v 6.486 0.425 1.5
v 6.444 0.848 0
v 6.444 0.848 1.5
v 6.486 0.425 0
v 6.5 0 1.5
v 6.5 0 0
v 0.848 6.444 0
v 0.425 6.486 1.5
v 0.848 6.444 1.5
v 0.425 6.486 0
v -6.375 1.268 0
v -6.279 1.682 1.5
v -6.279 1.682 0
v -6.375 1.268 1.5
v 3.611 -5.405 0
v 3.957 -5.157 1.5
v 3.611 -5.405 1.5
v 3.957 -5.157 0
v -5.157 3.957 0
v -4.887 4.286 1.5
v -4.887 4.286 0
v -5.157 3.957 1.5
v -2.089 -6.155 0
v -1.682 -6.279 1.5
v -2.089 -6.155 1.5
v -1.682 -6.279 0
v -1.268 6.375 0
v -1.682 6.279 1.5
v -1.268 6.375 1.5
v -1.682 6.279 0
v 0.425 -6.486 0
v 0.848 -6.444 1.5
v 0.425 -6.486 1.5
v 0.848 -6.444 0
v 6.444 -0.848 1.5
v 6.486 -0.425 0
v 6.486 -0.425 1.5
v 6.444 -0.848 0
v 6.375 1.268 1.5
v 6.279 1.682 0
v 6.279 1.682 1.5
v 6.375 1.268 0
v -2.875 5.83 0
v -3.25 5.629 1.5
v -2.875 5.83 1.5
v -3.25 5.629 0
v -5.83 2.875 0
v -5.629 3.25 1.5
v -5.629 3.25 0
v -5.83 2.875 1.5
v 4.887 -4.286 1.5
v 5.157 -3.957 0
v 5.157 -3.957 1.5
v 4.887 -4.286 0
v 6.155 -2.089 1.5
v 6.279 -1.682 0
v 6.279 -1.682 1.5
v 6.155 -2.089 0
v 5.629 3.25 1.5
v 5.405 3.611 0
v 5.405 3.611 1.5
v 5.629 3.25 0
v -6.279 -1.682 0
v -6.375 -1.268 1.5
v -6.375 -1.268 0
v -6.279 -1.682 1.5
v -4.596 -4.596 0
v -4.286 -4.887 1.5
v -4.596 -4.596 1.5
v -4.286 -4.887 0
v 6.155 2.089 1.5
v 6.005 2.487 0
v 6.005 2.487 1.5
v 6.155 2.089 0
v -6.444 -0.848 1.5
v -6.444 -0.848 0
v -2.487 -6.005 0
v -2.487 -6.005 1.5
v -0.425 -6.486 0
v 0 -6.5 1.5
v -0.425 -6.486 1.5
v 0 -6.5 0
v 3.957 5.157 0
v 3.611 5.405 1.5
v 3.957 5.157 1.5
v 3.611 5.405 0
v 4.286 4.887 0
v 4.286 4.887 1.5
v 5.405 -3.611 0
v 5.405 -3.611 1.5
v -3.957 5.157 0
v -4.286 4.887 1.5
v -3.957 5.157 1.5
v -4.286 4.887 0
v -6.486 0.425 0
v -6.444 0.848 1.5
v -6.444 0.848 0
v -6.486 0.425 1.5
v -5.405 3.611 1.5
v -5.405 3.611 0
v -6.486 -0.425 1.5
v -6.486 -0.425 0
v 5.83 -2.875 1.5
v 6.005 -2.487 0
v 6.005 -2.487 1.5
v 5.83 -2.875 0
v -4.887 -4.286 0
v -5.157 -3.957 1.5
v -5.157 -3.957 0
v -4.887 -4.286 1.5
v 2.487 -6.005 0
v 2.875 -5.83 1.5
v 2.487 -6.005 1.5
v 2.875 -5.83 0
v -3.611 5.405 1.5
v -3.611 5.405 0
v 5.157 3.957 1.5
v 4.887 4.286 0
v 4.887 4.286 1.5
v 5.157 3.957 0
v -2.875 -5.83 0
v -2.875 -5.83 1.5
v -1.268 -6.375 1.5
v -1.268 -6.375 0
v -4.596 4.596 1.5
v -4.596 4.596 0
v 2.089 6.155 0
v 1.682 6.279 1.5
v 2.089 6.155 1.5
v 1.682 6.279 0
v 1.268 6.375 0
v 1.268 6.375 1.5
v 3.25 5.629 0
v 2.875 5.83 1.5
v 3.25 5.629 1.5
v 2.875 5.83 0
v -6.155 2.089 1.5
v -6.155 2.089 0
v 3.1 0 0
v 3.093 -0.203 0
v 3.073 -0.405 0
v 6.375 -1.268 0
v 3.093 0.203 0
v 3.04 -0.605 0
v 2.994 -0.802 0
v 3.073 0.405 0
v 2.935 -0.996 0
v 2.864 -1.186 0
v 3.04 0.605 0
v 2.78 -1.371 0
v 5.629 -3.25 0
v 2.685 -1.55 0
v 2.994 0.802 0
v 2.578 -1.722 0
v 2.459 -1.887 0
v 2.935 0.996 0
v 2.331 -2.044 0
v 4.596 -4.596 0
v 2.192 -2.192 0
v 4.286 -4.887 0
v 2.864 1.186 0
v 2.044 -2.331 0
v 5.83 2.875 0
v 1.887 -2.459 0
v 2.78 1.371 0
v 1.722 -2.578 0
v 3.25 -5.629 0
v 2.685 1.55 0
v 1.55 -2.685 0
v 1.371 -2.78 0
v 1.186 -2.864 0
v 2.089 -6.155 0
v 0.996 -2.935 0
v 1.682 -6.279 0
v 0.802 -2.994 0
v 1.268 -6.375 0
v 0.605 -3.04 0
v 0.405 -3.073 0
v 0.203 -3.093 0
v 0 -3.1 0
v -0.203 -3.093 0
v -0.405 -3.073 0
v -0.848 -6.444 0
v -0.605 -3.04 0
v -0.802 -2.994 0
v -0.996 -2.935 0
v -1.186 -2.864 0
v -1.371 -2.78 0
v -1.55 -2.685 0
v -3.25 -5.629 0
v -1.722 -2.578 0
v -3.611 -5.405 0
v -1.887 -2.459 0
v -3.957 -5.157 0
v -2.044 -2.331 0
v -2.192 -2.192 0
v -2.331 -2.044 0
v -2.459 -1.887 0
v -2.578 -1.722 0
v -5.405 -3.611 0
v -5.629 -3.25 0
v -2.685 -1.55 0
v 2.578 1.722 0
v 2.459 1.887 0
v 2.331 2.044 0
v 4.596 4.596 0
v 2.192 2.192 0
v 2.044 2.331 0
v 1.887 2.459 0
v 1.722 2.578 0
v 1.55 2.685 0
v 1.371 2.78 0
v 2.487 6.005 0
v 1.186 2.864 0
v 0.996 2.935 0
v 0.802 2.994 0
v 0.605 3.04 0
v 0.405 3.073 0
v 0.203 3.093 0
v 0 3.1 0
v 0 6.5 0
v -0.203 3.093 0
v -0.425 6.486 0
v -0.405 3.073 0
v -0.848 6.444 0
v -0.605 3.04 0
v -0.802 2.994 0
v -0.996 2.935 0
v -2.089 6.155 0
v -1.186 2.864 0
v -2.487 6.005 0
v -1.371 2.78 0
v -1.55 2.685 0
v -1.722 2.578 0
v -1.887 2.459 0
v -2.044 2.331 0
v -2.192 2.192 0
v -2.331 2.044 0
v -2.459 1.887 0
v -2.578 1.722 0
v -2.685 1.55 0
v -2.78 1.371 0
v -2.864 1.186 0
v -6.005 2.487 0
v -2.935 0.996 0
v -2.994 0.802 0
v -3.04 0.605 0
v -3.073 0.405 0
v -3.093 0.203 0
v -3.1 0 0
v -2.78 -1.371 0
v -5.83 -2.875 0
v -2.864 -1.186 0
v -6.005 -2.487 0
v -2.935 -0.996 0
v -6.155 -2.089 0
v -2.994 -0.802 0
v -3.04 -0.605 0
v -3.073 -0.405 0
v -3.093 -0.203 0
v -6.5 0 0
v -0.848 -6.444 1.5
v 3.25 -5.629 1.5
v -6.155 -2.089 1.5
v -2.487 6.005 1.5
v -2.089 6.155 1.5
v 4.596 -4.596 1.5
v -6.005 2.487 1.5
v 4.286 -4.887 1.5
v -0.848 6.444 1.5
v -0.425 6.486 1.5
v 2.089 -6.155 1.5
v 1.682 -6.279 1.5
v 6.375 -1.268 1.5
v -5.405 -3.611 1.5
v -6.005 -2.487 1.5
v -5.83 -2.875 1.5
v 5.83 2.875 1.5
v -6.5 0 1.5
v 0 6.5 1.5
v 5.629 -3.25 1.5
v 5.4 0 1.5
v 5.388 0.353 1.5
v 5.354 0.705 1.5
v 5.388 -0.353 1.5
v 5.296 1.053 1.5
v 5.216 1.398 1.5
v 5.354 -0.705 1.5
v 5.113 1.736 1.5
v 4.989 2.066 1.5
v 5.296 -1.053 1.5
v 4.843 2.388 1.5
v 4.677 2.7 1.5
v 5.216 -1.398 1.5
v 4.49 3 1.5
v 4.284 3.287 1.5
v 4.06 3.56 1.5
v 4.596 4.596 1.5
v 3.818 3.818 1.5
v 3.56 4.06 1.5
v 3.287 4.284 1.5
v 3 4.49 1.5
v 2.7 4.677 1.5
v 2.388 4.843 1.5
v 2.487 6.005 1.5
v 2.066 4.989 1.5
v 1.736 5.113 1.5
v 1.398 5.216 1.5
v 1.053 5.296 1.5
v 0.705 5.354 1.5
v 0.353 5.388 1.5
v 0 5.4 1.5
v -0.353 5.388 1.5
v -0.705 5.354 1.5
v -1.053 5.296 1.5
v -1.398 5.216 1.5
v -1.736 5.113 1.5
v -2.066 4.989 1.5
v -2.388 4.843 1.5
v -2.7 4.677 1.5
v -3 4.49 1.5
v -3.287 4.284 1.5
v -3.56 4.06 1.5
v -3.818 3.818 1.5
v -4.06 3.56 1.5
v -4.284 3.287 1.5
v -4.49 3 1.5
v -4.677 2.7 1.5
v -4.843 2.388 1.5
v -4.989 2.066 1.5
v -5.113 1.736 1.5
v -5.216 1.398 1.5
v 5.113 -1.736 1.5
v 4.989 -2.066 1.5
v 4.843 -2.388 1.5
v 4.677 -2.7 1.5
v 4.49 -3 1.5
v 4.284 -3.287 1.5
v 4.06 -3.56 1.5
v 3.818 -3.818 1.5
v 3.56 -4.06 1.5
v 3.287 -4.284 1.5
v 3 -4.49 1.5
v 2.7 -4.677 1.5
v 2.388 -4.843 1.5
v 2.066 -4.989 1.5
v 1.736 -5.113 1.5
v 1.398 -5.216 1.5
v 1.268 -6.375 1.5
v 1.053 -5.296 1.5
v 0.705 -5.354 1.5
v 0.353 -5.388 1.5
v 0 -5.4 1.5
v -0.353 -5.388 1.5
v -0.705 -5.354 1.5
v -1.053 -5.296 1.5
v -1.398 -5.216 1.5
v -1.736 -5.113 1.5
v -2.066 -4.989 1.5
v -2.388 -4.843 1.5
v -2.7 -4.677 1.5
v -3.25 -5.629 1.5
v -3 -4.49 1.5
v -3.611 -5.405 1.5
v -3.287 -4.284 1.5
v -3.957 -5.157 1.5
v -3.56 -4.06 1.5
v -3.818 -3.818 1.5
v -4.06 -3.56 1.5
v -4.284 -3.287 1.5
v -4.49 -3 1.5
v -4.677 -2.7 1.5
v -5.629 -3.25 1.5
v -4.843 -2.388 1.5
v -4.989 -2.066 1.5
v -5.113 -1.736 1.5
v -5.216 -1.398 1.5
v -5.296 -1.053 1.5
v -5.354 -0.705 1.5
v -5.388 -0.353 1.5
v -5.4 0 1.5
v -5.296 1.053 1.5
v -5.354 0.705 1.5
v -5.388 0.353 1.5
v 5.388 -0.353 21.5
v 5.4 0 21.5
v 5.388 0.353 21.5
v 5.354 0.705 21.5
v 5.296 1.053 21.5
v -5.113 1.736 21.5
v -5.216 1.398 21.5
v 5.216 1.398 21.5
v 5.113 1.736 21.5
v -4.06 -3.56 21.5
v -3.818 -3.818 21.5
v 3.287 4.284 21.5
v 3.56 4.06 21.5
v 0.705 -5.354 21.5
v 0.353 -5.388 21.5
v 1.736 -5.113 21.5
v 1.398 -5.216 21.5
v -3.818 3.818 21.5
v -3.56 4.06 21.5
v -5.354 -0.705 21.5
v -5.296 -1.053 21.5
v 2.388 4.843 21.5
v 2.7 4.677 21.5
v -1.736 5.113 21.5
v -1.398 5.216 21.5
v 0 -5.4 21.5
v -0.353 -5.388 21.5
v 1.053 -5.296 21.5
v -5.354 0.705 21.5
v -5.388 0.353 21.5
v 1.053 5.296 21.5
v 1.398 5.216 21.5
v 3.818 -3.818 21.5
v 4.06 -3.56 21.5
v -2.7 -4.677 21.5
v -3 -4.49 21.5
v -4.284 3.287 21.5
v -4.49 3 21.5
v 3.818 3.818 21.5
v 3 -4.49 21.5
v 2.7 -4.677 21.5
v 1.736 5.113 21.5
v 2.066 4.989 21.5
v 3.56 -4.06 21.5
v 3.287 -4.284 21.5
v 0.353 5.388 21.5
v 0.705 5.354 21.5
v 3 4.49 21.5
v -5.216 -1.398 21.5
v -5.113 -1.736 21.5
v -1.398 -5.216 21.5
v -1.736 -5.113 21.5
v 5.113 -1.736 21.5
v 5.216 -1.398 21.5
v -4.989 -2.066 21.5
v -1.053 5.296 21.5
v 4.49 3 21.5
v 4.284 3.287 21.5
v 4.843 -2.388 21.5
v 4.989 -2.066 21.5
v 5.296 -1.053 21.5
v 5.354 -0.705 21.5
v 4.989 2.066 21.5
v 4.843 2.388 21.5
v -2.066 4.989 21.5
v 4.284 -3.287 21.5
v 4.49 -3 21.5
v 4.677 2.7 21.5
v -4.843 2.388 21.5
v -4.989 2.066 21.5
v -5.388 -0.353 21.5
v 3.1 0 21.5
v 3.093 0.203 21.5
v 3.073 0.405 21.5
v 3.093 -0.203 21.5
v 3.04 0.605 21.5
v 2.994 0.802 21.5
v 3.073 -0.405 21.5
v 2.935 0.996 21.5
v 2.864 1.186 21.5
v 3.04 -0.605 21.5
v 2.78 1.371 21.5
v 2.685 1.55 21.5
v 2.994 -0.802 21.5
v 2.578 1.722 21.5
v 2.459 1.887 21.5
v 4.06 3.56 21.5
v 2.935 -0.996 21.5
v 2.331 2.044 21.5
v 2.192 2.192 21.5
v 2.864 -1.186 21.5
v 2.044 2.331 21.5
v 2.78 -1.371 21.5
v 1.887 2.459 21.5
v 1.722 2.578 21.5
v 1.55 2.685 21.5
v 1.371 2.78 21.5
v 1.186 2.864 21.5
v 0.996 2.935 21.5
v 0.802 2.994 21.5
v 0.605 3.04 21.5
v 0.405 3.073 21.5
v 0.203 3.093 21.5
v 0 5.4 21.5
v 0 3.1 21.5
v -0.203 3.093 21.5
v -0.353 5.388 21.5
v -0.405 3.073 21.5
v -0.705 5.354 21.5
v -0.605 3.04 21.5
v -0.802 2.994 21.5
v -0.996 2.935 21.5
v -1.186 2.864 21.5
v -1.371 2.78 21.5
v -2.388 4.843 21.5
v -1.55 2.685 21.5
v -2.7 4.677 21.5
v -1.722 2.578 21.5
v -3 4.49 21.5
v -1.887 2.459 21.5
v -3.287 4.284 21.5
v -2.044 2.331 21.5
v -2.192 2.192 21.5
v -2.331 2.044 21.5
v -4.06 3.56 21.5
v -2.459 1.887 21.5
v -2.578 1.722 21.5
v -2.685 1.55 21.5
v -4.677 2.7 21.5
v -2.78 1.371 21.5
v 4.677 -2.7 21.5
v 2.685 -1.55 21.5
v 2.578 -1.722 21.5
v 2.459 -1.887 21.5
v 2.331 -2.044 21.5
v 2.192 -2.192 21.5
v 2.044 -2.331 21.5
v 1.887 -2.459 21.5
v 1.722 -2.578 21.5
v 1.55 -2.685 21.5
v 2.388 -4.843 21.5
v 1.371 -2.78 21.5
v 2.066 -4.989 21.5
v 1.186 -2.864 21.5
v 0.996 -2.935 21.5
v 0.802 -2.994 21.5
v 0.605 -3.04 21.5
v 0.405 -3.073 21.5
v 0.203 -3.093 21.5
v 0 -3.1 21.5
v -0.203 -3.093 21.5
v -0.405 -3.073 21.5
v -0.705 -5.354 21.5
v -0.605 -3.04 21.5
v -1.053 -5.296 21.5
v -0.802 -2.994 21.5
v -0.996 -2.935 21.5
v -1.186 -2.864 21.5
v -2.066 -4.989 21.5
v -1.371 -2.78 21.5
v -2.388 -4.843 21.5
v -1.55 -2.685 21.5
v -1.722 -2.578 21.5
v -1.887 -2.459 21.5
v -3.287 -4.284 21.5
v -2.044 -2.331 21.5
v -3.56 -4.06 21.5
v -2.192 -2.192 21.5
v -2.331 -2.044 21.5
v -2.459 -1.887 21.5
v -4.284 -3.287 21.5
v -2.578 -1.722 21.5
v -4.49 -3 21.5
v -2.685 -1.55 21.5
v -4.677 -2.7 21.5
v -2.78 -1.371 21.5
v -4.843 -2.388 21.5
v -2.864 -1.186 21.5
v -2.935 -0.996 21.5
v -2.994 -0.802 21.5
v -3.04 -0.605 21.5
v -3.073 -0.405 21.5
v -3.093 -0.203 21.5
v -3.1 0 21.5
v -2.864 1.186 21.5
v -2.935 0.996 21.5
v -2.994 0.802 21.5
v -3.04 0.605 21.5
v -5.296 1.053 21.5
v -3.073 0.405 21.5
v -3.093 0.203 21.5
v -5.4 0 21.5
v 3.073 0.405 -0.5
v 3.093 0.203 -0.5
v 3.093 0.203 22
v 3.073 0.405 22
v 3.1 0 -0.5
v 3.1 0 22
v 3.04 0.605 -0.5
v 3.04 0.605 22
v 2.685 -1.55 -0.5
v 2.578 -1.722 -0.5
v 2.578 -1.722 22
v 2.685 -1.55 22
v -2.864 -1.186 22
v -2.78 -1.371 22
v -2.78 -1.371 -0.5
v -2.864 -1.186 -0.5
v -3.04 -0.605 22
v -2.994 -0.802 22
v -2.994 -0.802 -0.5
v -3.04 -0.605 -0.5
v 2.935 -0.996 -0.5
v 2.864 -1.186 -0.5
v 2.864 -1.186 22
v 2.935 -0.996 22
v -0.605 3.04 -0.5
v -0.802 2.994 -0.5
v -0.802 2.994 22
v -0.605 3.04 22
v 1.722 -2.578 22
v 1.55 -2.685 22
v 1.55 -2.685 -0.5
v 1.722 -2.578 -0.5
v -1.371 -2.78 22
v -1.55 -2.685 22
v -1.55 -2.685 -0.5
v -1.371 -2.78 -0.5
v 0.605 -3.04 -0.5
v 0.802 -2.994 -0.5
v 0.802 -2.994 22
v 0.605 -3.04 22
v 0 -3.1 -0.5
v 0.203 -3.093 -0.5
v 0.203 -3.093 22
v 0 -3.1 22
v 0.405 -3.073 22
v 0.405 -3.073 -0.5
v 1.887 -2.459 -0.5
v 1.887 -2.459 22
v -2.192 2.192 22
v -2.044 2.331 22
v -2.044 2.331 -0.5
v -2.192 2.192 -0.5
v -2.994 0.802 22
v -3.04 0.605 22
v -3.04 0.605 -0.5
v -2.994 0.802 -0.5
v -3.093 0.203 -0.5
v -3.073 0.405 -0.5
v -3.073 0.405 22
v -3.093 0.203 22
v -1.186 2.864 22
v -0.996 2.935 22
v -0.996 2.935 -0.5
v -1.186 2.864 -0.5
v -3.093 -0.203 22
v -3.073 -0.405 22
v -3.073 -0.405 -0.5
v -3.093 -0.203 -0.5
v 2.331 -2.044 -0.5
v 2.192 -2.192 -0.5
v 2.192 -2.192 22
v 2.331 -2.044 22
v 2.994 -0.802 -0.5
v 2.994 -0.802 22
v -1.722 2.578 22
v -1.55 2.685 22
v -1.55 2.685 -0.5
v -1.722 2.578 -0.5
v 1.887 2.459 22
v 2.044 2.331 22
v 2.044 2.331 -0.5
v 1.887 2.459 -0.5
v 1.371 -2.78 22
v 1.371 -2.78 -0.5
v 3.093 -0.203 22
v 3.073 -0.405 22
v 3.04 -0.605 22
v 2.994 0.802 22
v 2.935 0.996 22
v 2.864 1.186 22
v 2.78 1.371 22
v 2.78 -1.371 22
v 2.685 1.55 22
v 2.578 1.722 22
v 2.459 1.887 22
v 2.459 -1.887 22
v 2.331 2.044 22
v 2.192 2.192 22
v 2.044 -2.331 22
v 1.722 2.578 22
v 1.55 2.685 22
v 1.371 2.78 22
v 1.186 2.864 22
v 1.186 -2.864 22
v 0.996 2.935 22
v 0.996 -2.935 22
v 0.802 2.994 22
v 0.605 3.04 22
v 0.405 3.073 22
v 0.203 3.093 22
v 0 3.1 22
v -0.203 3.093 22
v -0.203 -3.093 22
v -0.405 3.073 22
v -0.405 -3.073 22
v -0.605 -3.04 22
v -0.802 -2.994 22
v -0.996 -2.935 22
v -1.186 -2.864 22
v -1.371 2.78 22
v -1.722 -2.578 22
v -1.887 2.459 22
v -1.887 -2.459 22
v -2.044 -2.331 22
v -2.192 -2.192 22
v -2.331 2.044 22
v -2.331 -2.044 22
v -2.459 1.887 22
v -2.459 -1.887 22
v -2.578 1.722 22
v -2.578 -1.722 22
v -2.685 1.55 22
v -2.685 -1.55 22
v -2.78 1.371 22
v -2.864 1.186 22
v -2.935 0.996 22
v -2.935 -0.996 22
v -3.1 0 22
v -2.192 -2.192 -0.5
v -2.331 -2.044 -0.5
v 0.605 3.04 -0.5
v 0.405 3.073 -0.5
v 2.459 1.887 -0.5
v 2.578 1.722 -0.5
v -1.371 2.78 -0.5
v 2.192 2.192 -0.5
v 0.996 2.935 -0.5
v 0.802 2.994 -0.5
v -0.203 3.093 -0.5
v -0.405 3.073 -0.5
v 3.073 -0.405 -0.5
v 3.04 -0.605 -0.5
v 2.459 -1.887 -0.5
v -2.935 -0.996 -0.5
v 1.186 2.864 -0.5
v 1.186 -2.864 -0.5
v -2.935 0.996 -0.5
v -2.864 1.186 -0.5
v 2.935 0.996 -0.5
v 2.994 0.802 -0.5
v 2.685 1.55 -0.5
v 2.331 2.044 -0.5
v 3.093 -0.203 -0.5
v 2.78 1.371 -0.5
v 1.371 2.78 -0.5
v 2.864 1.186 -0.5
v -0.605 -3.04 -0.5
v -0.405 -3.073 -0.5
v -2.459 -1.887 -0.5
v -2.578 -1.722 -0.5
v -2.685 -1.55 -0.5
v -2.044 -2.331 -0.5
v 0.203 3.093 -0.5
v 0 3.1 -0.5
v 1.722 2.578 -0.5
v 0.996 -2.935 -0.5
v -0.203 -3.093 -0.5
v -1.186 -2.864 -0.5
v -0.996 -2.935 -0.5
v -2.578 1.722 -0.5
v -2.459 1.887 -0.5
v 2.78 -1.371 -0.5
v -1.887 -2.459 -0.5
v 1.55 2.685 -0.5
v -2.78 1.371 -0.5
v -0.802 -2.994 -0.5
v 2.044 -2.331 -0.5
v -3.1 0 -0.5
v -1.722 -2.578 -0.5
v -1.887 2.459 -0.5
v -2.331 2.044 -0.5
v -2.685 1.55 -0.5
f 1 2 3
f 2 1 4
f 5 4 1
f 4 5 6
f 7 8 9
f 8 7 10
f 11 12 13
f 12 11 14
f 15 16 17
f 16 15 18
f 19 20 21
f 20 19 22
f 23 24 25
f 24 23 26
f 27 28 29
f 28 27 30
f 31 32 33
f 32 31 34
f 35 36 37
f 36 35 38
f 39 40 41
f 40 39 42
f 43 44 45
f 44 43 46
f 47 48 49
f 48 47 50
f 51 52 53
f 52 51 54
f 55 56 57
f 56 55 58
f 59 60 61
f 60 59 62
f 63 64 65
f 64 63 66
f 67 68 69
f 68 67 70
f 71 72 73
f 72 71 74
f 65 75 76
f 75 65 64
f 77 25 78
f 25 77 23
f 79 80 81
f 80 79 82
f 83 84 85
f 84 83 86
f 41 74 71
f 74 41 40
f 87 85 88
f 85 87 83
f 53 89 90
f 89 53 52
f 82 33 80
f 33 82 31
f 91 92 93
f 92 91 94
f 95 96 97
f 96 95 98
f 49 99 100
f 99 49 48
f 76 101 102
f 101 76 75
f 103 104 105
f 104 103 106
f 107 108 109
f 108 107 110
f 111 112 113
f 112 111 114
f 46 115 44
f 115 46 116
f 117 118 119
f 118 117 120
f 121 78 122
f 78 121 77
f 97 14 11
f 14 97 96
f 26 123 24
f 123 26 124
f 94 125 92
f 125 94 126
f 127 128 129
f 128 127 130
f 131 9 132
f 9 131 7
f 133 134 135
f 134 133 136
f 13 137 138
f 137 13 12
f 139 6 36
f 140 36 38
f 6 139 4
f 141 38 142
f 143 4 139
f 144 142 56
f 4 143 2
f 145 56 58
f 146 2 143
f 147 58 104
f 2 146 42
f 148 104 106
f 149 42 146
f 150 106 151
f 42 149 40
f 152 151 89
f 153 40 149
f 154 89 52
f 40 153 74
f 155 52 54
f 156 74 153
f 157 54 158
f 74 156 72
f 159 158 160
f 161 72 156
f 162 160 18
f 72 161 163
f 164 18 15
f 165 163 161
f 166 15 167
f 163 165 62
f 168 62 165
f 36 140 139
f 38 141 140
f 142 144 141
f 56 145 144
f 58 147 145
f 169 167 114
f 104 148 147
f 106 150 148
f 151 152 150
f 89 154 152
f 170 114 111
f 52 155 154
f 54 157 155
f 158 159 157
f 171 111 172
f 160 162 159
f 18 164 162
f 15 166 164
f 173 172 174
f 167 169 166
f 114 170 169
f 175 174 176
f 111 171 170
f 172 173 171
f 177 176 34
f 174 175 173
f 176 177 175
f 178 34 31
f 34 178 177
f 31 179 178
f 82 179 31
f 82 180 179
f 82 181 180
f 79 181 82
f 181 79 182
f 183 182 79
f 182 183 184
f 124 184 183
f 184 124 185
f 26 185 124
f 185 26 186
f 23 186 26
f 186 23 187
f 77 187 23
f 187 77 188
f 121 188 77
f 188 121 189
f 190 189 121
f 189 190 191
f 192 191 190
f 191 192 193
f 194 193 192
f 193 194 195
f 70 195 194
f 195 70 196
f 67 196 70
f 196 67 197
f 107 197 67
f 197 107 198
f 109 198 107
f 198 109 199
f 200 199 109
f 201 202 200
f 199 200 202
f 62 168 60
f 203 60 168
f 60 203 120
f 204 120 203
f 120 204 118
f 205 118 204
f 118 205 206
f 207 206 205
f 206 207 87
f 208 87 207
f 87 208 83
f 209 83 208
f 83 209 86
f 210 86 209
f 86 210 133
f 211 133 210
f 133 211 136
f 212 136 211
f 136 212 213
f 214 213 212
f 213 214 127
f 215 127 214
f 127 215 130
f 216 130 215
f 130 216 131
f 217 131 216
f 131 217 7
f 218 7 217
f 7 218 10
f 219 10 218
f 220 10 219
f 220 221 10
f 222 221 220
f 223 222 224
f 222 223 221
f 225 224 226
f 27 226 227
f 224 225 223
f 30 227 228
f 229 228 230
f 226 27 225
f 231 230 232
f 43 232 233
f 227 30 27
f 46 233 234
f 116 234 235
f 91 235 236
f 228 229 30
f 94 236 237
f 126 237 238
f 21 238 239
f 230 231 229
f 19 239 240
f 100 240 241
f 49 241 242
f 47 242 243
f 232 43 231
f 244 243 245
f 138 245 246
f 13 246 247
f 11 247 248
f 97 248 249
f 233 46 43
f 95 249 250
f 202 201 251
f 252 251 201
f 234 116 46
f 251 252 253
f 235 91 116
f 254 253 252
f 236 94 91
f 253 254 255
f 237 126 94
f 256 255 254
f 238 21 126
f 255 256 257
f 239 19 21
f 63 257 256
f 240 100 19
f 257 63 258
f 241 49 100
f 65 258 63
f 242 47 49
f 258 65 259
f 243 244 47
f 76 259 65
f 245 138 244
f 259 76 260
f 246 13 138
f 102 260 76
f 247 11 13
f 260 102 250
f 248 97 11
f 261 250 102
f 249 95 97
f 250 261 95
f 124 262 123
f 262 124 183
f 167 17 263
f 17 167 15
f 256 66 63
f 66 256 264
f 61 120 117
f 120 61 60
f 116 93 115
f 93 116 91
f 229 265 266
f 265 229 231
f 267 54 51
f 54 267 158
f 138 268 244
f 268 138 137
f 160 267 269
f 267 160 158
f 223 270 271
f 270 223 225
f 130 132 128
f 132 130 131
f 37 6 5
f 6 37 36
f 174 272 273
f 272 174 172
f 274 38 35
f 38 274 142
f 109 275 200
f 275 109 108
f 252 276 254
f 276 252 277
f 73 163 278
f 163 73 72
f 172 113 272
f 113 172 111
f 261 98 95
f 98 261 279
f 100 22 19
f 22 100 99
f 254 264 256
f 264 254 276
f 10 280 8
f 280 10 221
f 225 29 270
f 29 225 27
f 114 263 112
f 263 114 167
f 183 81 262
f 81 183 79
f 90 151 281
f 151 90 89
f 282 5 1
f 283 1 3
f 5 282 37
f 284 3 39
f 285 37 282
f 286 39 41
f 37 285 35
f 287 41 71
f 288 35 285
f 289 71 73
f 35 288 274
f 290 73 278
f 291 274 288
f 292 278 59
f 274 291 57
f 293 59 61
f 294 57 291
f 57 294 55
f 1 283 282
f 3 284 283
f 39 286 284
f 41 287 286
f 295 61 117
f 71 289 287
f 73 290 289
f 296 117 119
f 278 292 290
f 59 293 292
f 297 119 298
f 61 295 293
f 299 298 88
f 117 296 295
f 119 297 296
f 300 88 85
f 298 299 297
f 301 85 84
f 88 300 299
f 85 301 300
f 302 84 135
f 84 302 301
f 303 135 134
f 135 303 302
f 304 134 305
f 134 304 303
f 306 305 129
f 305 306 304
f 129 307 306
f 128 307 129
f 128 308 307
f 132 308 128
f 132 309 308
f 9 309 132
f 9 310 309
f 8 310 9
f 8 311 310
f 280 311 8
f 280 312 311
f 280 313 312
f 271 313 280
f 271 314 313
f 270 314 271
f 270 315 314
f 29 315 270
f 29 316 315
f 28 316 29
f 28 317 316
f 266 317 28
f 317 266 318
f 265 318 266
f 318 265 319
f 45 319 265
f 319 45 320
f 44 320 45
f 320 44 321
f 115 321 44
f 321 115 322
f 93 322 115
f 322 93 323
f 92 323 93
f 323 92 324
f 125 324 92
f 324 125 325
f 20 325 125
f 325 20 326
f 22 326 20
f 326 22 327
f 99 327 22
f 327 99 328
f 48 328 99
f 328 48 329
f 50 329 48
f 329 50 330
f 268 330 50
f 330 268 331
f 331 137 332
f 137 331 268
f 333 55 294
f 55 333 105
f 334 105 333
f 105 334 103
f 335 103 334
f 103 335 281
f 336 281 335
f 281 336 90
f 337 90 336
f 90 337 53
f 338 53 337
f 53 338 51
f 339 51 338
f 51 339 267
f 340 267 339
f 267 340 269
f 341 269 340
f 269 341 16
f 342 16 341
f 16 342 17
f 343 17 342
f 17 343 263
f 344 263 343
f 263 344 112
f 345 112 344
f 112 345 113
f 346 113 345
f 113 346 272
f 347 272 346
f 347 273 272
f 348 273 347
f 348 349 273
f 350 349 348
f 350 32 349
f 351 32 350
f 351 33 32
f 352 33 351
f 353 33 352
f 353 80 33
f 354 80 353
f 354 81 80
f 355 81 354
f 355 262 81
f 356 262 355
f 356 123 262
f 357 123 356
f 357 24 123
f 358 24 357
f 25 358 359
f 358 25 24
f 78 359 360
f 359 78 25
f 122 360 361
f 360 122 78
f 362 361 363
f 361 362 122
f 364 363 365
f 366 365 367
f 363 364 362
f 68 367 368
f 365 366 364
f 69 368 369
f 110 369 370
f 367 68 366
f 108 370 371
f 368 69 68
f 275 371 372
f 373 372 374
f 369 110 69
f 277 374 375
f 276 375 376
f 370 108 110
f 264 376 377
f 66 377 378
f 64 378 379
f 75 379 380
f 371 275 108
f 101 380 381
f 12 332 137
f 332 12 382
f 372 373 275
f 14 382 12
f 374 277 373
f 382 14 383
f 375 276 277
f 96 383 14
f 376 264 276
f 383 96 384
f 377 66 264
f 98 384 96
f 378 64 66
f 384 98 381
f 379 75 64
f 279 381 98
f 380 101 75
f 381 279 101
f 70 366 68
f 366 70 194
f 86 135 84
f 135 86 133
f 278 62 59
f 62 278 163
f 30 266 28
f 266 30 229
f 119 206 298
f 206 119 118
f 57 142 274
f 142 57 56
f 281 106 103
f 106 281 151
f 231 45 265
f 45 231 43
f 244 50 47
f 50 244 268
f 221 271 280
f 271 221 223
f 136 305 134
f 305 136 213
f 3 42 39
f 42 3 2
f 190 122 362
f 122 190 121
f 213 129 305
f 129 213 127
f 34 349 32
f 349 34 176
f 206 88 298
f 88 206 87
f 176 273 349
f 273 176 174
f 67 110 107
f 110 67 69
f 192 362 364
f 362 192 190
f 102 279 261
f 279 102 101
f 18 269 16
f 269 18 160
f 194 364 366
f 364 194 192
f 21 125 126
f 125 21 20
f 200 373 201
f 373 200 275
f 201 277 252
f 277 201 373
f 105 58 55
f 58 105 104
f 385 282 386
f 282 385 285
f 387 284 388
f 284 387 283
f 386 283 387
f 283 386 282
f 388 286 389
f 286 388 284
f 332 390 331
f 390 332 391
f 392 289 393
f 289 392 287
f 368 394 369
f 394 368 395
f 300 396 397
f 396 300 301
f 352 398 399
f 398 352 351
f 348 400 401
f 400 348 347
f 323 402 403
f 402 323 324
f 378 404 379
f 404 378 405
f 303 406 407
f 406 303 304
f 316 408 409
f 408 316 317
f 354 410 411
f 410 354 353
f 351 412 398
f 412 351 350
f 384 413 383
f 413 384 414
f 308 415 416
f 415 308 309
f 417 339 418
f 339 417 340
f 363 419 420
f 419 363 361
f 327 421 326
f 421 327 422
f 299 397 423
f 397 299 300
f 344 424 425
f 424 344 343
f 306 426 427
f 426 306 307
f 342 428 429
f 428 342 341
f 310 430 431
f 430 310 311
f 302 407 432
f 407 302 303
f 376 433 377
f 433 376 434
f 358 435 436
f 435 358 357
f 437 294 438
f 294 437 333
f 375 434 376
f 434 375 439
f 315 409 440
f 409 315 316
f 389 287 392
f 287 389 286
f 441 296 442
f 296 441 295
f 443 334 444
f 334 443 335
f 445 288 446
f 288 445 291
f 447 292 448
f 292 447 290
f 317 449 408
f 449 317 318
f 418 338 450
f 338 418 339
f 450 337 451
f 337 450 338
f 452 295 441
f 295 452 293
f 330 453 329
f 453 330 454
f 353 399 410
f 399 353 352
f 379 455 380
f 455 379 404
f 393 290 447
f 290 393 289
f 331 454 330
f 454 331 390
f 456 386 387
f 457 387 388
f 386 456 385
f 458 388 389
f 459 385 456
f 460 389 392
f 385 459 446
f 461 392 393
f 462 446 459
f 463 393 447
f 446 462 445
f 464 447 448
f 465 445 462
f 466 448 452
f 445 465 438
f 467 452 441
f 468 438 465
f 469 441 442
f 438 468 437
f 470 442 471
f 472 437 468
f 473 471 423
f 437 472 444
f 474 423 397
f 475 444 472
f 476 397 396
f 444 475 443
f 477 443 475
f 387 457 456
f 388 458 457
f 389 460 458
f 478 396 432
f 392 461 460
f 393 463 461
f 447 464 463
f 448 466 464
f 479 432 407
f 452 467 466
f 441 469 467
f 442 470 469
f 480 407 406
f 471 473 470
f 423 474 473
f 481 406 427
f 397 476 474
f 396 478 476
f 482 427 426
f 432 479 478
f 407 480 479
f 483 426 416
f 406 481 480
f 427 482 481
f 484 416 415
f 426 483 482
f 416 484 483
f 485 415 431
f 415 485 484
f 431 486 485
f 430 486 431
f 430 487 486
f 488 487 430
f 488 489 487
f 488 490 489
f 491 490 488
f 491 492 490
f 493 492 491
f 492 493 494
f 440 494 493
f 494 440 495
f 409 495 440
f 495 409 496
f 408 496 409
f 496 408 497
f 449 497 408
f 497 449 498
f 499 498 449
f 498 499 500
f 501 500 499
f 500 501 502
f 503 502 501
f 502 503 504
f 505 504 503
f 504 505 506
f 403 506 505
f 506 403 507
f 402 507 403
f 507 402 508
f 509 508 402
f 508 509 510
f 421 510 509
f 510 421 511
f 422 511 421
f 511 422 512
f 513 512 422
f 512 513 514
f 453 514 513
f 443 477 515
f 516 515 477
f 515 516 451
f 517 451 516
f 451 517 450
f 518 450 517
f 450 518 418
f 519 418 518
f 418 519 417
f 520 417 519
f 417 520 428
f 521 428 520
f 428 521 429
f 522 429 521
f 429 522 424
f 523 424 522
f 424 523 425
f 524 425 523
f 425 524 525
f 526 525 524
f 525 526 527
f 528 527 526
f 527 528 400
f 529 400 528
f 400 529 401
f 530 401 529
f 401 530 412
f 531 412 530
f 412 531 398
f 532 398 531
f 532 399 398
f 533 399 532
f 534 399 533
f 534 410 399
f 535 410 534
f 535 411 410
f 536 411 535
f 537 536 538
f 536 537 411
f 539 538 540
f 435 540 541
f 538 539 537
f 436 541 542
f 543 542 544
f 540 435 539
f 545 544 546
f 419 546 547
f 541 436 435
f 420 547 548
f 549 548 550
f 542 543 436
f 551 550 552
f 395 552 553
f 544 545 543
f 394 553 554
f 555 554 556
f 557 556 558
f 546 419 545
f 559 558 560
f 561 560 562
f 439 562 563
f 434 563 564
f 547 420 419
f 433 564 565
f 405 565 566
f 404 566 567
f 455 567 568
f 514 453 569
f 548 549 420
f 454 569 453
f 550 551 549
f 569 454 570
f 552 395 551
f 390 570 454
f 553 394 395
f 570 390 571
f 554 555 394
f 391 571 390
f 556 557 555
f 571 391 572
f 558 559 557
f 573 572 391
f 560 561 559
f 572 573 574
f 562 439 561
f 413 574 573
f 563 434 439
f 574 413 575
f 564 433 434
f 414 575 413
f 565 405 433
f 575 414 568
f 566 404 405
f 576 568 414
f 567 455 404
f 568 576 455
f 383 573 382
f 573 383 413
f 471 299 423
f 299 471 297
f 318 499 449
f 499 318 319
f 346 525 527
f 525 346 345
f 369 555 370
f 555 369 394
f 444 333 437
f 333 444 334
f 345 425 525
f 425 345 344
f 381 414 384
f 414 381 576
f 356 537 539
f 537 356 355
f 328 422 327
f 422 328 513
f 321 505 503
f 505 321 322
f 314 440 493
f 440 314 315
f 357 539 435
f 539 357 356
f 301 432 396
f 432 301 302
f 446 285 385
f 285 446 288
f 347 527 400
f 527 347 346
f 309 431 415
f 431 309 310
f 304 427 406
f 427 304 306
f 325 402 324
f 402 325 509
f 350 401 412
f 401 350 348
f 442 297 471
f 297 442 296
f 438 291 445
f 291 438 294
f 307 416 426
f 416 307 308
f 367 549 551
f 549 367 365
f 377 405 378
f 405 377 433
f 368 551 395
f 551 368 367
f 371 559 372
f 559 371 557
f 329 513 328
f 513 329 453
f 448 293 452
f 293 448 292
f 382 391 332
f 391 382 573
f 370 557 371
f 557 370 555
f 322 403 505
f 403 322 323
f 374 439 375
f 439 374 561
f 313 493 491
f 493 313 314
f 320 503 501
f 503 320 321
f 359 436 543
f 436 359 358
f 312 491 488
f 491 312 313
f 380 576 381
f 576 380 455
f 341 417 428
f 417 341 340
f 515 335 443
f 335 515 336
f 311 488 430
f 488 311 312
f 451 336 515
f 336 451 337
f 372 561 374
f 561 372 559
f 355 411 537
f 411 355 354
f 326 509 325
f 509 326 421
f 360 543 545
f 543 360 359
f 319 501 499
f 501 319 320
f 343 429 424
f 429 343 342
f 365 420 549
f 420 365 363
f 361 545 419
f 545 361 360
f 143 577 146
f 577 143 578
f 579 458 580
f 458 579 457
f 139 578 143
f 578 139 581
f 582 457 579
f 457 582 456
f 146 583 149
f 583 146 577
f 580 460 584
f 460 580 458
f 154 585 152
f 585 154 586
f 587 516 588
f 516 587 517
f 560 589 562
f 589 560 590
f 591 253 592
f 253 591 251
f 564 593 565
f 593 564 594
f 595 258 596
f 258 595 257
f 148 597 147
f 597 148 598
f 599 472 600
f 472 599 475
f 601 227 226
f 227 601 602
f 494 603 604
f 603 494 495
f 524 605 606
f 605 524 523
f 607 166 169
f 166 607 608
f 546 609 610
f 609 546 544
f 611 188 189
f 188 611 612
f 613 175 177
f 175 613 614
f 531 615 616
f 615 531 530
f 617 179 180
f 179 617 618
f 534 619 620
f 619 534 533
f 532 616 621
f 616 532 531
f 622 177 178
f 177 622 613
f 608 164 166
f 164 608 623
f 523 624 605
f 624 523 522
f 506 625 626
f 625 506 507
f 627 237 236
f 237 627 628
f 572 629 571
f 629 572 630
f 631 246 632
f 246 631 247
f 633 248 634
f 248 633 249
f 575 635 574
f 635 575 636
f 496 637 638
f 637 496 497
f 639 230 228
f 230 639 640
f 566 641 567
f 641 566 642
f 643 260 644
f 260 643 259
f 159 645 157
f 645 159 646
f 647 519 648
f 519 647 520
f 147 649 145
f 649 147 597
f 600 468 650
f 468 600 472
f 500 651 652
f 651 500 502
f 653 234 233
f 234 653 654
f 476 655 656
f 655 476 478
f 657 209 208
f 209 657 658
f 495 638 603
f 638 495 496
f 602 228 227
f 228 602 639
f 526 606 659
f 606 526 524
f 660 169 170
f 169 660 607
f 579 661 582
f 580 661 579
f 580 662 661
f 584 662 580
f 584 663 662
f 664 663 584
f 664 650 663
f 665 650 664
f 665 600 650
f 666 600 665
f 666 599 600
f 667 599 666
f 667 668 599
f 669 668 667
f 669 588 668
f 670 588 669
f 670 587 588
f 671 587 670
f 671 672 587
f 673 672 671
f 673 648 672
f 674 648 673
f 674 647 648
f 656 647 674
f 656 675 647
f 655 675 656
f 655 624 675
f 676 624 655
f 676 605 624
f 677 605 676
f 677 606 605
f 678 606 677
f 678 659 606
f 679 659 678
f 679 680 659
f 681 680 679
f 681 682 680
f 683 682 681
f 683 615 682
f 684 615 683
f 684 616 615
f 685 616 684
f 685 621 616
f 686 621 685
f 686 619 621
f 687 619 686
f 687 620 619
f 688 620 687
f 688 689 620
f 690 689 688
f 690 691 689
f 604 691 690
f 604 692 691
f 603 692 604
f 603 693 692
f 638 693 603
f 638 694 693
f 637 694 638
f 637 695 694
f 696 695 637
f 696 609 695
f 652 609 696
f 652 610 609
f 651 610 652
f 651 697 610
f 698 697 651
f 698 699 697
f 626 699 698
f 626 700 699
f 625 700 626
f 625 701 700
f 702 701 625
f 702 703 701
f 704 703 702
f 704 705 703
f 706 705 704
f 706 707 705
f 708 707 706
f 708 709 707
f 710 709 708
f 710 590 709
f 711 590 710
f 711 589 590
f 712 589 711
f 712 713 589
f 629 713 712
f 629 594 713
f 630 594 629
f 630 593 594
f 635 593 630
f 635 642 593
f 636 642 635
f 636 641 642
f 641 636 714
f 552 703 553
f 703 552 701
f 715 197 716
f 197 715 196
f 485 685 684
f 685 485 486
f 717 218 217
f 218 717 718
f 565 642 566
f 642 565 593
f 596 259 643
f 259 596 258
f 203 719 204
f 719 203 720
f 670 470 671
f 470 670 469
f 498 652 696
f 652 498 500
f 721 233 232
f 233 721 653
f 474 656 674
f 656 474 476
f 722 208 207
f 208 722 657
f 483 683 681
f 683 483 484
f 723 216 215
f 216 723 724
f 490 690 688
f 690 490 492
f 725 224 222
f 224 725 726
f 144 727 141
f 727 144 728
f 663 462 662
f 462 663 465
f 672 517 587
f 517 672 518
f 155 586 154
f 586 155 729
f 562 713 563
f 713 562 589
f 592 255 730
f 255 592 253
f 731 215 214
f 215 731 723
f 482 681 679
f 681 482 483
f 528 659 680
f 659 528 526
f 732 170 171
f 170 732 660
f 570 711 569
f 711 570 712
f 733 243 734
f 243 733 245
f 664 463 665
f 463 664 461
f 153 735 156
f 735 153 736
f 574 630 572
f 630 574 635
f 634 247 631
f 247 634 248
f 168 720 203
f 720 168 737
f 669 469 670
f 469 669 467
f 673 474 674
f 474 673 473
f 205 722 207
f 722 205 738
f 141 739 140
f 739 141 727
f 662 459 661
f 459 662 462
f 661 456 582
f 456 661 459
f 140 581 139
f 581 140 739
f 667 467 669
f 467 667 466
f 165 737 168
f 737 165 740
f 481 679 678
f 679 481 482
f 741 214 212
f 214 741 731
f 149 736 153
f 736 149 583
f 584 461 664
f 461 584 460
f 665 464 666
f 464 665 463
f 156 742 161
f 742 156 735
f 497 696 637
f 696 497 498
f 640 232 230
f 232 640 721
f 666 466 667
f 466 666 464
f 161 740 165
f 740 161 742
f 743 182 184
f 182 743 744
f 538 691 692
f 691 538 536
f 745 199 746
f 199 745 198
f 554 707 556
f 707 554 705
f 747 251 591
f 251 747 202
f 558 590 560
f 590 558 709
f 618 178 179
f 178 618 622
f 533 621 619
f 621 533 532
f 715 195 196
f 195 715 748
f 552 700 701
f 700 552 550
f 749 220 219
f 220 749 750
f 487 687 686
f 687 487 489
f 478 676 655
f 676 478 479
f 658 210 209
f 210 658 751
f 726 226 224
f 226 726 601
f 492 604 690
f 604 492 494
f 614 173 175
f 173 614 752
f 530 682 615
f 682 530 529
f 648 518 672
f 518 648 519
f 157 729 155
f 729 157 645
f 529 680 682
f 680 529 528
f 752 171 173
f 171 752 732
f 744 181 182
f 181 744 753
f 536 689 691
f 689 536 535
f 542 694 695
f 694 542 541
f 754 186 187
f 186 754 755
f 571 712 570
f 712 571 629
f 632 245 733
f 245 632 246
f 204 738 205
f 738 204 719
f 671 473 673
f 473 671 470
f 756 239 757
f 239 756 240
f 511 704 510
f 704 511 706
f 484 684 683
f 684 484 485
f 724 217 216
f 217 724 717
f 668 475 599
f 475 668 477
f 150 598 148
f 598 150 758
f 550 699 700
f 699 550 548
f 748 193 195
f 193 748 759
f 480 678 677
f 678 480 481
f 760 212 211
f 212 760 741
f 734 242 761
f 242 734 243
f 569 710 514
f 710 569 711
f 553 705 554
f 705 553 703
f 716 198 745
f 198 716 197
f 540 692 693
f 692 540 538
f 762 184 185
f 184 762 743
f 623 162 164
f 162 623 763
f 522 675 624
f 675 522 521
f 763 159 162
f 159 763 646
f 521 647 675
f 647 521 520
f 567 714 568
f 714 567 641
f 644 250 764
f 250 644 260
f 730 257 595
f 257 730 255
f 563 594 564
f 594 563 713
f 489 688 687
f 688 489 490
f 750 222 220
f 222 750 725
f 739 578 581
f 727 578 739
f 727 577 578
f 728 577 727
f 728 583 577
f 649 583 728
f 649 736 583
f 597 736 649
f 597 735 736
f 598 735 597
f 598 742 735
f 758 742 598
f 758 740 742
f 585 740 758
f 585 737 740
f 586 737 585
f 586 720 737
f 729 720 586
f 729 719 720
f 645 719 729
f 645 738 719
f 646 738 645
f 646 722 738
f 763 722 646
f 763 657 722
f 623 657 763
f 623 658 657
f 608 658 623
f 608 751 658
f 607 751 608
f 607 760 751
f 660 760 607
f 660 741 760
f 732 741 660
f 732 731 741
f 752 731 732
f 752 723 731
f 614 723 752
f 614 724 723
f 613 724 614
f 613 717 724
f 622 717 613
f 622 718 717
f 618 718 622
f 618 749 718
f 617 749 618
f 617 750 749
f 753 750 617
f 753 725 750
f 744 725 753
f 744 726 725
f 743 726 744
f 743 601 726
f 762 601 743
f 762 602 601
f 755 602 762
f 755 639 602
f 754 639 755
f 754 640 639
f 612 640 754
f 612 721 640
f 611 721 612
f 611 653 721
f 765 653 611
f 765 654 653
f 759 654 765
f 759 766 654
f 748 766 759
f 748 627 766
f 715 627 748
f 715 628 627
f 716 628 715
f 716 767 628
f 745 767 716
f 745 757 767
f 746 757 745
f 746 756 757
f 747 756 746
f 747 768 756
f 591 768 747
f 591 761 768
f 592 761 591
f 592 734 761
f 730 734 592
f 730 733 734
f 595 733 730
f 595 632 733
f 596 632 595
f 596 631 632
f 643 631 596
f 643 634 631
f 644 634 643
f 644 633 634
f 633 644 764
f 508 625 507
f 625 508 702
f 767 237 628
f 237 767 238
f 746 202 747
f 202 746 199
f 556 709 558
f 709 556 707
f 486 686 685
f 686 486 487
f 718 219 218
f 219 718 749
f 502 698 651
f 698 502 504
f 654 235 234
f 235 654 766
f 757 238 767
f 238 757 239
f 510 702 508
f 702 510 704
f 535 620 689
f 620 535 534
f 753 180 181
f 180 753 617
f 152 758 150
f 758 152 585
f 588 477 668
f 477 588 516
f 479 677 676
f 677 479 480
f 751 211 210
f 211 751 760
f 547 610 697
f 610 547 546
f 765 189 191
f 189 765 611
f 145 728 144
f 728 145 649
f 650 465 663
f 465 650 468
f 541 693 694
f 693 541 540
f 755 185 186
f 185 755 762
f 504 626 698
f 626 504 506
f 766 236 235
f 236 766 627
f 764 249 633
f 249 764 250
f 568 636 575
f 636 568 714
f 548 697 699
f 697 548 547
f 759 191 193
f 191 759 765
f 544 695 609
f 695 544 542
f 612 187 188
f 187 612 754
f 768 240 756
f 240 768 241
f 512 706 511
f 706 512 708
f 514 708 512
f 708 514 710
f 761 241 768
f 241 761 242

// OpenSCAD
// PCR tube adapter sleeve - print upside down
// Units: mm

$fn = 96;

// ---- Dimensions ----
collar_d        = 13;    // collar outer diameter
collar_t        = 1.5;   // collar thickness (z = 0 to 1.5)
sleeve_od       = 10.8;  // sleeve outer diameter
sleeve_h        = 21.5;  // sleeve total height (z = 0 to 21.5)
bore_d          = 6.2;   // through-bore diameter
eps             = 0.5;   // cutter overshoot past faces

// ---- Model ----
union() {
    // Collar on the bed
    cylinder(d = collar_d, h = collar_t);

    // Sleeve body rising from the collar
    translate([0, 0, collar_t])
        cylinder(d = sleeve_od, h = sleeve_h - collar_t);
}

// Full-height bore, open at both ends
translate([0, 0, -eps])
    cylinder(d = bore_d, h = sleeve_h + 2 * eps);
